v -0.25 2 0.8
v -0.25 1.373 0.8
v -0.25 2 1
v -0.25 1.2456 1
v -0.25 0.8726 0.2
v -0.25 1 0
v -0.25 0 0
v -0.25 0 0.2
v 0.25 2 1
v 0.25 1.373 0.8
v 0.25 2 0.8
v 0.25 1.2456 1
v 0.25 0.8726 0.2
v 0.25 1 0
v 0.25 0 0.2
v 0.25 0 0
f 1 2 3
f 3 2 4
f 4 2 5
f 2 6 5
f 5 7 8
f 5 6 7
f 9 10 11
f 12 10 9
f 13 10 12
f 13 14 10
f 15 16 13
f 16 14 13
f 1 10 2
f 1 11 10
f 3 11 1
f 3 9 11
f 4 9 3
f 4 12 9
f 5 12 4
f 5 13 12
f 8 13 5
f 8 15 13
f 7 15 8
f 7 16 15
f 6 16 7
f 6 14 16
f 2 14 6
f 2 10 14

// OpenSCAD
// This module outputs bended pin
// _L - whole pin length
// _l - length of bottom part
// _H - whole pin height
// _th - pin thickness
// _a - bending angle
// _W - pin width
module pin(_L,_l,_H,_th,_a,_W)
{
	// Internal variables
    _d1 = _th*sin(_a) / (1-cos(_a));
    _d2 = (_th-_H)*cos(_a) / sin(_a);

	rotate([90,0,90])
    // Extrude the following polygon
	linear_extrude(height = _W, center = true, convexity = 10, twist = 0)
        polygon([[0,0],
                 [_l,0],
				 [_l+_d2,_H-_th],
				 [_L,_H-_th],
				 [_L,_H],
				 [_l+_d2-_d1,_H],
				 [_l-_d1,_th],
				 [0,_th]]);
}

// Example of usage
pin(2,1,1,0.2,115,0.5);
